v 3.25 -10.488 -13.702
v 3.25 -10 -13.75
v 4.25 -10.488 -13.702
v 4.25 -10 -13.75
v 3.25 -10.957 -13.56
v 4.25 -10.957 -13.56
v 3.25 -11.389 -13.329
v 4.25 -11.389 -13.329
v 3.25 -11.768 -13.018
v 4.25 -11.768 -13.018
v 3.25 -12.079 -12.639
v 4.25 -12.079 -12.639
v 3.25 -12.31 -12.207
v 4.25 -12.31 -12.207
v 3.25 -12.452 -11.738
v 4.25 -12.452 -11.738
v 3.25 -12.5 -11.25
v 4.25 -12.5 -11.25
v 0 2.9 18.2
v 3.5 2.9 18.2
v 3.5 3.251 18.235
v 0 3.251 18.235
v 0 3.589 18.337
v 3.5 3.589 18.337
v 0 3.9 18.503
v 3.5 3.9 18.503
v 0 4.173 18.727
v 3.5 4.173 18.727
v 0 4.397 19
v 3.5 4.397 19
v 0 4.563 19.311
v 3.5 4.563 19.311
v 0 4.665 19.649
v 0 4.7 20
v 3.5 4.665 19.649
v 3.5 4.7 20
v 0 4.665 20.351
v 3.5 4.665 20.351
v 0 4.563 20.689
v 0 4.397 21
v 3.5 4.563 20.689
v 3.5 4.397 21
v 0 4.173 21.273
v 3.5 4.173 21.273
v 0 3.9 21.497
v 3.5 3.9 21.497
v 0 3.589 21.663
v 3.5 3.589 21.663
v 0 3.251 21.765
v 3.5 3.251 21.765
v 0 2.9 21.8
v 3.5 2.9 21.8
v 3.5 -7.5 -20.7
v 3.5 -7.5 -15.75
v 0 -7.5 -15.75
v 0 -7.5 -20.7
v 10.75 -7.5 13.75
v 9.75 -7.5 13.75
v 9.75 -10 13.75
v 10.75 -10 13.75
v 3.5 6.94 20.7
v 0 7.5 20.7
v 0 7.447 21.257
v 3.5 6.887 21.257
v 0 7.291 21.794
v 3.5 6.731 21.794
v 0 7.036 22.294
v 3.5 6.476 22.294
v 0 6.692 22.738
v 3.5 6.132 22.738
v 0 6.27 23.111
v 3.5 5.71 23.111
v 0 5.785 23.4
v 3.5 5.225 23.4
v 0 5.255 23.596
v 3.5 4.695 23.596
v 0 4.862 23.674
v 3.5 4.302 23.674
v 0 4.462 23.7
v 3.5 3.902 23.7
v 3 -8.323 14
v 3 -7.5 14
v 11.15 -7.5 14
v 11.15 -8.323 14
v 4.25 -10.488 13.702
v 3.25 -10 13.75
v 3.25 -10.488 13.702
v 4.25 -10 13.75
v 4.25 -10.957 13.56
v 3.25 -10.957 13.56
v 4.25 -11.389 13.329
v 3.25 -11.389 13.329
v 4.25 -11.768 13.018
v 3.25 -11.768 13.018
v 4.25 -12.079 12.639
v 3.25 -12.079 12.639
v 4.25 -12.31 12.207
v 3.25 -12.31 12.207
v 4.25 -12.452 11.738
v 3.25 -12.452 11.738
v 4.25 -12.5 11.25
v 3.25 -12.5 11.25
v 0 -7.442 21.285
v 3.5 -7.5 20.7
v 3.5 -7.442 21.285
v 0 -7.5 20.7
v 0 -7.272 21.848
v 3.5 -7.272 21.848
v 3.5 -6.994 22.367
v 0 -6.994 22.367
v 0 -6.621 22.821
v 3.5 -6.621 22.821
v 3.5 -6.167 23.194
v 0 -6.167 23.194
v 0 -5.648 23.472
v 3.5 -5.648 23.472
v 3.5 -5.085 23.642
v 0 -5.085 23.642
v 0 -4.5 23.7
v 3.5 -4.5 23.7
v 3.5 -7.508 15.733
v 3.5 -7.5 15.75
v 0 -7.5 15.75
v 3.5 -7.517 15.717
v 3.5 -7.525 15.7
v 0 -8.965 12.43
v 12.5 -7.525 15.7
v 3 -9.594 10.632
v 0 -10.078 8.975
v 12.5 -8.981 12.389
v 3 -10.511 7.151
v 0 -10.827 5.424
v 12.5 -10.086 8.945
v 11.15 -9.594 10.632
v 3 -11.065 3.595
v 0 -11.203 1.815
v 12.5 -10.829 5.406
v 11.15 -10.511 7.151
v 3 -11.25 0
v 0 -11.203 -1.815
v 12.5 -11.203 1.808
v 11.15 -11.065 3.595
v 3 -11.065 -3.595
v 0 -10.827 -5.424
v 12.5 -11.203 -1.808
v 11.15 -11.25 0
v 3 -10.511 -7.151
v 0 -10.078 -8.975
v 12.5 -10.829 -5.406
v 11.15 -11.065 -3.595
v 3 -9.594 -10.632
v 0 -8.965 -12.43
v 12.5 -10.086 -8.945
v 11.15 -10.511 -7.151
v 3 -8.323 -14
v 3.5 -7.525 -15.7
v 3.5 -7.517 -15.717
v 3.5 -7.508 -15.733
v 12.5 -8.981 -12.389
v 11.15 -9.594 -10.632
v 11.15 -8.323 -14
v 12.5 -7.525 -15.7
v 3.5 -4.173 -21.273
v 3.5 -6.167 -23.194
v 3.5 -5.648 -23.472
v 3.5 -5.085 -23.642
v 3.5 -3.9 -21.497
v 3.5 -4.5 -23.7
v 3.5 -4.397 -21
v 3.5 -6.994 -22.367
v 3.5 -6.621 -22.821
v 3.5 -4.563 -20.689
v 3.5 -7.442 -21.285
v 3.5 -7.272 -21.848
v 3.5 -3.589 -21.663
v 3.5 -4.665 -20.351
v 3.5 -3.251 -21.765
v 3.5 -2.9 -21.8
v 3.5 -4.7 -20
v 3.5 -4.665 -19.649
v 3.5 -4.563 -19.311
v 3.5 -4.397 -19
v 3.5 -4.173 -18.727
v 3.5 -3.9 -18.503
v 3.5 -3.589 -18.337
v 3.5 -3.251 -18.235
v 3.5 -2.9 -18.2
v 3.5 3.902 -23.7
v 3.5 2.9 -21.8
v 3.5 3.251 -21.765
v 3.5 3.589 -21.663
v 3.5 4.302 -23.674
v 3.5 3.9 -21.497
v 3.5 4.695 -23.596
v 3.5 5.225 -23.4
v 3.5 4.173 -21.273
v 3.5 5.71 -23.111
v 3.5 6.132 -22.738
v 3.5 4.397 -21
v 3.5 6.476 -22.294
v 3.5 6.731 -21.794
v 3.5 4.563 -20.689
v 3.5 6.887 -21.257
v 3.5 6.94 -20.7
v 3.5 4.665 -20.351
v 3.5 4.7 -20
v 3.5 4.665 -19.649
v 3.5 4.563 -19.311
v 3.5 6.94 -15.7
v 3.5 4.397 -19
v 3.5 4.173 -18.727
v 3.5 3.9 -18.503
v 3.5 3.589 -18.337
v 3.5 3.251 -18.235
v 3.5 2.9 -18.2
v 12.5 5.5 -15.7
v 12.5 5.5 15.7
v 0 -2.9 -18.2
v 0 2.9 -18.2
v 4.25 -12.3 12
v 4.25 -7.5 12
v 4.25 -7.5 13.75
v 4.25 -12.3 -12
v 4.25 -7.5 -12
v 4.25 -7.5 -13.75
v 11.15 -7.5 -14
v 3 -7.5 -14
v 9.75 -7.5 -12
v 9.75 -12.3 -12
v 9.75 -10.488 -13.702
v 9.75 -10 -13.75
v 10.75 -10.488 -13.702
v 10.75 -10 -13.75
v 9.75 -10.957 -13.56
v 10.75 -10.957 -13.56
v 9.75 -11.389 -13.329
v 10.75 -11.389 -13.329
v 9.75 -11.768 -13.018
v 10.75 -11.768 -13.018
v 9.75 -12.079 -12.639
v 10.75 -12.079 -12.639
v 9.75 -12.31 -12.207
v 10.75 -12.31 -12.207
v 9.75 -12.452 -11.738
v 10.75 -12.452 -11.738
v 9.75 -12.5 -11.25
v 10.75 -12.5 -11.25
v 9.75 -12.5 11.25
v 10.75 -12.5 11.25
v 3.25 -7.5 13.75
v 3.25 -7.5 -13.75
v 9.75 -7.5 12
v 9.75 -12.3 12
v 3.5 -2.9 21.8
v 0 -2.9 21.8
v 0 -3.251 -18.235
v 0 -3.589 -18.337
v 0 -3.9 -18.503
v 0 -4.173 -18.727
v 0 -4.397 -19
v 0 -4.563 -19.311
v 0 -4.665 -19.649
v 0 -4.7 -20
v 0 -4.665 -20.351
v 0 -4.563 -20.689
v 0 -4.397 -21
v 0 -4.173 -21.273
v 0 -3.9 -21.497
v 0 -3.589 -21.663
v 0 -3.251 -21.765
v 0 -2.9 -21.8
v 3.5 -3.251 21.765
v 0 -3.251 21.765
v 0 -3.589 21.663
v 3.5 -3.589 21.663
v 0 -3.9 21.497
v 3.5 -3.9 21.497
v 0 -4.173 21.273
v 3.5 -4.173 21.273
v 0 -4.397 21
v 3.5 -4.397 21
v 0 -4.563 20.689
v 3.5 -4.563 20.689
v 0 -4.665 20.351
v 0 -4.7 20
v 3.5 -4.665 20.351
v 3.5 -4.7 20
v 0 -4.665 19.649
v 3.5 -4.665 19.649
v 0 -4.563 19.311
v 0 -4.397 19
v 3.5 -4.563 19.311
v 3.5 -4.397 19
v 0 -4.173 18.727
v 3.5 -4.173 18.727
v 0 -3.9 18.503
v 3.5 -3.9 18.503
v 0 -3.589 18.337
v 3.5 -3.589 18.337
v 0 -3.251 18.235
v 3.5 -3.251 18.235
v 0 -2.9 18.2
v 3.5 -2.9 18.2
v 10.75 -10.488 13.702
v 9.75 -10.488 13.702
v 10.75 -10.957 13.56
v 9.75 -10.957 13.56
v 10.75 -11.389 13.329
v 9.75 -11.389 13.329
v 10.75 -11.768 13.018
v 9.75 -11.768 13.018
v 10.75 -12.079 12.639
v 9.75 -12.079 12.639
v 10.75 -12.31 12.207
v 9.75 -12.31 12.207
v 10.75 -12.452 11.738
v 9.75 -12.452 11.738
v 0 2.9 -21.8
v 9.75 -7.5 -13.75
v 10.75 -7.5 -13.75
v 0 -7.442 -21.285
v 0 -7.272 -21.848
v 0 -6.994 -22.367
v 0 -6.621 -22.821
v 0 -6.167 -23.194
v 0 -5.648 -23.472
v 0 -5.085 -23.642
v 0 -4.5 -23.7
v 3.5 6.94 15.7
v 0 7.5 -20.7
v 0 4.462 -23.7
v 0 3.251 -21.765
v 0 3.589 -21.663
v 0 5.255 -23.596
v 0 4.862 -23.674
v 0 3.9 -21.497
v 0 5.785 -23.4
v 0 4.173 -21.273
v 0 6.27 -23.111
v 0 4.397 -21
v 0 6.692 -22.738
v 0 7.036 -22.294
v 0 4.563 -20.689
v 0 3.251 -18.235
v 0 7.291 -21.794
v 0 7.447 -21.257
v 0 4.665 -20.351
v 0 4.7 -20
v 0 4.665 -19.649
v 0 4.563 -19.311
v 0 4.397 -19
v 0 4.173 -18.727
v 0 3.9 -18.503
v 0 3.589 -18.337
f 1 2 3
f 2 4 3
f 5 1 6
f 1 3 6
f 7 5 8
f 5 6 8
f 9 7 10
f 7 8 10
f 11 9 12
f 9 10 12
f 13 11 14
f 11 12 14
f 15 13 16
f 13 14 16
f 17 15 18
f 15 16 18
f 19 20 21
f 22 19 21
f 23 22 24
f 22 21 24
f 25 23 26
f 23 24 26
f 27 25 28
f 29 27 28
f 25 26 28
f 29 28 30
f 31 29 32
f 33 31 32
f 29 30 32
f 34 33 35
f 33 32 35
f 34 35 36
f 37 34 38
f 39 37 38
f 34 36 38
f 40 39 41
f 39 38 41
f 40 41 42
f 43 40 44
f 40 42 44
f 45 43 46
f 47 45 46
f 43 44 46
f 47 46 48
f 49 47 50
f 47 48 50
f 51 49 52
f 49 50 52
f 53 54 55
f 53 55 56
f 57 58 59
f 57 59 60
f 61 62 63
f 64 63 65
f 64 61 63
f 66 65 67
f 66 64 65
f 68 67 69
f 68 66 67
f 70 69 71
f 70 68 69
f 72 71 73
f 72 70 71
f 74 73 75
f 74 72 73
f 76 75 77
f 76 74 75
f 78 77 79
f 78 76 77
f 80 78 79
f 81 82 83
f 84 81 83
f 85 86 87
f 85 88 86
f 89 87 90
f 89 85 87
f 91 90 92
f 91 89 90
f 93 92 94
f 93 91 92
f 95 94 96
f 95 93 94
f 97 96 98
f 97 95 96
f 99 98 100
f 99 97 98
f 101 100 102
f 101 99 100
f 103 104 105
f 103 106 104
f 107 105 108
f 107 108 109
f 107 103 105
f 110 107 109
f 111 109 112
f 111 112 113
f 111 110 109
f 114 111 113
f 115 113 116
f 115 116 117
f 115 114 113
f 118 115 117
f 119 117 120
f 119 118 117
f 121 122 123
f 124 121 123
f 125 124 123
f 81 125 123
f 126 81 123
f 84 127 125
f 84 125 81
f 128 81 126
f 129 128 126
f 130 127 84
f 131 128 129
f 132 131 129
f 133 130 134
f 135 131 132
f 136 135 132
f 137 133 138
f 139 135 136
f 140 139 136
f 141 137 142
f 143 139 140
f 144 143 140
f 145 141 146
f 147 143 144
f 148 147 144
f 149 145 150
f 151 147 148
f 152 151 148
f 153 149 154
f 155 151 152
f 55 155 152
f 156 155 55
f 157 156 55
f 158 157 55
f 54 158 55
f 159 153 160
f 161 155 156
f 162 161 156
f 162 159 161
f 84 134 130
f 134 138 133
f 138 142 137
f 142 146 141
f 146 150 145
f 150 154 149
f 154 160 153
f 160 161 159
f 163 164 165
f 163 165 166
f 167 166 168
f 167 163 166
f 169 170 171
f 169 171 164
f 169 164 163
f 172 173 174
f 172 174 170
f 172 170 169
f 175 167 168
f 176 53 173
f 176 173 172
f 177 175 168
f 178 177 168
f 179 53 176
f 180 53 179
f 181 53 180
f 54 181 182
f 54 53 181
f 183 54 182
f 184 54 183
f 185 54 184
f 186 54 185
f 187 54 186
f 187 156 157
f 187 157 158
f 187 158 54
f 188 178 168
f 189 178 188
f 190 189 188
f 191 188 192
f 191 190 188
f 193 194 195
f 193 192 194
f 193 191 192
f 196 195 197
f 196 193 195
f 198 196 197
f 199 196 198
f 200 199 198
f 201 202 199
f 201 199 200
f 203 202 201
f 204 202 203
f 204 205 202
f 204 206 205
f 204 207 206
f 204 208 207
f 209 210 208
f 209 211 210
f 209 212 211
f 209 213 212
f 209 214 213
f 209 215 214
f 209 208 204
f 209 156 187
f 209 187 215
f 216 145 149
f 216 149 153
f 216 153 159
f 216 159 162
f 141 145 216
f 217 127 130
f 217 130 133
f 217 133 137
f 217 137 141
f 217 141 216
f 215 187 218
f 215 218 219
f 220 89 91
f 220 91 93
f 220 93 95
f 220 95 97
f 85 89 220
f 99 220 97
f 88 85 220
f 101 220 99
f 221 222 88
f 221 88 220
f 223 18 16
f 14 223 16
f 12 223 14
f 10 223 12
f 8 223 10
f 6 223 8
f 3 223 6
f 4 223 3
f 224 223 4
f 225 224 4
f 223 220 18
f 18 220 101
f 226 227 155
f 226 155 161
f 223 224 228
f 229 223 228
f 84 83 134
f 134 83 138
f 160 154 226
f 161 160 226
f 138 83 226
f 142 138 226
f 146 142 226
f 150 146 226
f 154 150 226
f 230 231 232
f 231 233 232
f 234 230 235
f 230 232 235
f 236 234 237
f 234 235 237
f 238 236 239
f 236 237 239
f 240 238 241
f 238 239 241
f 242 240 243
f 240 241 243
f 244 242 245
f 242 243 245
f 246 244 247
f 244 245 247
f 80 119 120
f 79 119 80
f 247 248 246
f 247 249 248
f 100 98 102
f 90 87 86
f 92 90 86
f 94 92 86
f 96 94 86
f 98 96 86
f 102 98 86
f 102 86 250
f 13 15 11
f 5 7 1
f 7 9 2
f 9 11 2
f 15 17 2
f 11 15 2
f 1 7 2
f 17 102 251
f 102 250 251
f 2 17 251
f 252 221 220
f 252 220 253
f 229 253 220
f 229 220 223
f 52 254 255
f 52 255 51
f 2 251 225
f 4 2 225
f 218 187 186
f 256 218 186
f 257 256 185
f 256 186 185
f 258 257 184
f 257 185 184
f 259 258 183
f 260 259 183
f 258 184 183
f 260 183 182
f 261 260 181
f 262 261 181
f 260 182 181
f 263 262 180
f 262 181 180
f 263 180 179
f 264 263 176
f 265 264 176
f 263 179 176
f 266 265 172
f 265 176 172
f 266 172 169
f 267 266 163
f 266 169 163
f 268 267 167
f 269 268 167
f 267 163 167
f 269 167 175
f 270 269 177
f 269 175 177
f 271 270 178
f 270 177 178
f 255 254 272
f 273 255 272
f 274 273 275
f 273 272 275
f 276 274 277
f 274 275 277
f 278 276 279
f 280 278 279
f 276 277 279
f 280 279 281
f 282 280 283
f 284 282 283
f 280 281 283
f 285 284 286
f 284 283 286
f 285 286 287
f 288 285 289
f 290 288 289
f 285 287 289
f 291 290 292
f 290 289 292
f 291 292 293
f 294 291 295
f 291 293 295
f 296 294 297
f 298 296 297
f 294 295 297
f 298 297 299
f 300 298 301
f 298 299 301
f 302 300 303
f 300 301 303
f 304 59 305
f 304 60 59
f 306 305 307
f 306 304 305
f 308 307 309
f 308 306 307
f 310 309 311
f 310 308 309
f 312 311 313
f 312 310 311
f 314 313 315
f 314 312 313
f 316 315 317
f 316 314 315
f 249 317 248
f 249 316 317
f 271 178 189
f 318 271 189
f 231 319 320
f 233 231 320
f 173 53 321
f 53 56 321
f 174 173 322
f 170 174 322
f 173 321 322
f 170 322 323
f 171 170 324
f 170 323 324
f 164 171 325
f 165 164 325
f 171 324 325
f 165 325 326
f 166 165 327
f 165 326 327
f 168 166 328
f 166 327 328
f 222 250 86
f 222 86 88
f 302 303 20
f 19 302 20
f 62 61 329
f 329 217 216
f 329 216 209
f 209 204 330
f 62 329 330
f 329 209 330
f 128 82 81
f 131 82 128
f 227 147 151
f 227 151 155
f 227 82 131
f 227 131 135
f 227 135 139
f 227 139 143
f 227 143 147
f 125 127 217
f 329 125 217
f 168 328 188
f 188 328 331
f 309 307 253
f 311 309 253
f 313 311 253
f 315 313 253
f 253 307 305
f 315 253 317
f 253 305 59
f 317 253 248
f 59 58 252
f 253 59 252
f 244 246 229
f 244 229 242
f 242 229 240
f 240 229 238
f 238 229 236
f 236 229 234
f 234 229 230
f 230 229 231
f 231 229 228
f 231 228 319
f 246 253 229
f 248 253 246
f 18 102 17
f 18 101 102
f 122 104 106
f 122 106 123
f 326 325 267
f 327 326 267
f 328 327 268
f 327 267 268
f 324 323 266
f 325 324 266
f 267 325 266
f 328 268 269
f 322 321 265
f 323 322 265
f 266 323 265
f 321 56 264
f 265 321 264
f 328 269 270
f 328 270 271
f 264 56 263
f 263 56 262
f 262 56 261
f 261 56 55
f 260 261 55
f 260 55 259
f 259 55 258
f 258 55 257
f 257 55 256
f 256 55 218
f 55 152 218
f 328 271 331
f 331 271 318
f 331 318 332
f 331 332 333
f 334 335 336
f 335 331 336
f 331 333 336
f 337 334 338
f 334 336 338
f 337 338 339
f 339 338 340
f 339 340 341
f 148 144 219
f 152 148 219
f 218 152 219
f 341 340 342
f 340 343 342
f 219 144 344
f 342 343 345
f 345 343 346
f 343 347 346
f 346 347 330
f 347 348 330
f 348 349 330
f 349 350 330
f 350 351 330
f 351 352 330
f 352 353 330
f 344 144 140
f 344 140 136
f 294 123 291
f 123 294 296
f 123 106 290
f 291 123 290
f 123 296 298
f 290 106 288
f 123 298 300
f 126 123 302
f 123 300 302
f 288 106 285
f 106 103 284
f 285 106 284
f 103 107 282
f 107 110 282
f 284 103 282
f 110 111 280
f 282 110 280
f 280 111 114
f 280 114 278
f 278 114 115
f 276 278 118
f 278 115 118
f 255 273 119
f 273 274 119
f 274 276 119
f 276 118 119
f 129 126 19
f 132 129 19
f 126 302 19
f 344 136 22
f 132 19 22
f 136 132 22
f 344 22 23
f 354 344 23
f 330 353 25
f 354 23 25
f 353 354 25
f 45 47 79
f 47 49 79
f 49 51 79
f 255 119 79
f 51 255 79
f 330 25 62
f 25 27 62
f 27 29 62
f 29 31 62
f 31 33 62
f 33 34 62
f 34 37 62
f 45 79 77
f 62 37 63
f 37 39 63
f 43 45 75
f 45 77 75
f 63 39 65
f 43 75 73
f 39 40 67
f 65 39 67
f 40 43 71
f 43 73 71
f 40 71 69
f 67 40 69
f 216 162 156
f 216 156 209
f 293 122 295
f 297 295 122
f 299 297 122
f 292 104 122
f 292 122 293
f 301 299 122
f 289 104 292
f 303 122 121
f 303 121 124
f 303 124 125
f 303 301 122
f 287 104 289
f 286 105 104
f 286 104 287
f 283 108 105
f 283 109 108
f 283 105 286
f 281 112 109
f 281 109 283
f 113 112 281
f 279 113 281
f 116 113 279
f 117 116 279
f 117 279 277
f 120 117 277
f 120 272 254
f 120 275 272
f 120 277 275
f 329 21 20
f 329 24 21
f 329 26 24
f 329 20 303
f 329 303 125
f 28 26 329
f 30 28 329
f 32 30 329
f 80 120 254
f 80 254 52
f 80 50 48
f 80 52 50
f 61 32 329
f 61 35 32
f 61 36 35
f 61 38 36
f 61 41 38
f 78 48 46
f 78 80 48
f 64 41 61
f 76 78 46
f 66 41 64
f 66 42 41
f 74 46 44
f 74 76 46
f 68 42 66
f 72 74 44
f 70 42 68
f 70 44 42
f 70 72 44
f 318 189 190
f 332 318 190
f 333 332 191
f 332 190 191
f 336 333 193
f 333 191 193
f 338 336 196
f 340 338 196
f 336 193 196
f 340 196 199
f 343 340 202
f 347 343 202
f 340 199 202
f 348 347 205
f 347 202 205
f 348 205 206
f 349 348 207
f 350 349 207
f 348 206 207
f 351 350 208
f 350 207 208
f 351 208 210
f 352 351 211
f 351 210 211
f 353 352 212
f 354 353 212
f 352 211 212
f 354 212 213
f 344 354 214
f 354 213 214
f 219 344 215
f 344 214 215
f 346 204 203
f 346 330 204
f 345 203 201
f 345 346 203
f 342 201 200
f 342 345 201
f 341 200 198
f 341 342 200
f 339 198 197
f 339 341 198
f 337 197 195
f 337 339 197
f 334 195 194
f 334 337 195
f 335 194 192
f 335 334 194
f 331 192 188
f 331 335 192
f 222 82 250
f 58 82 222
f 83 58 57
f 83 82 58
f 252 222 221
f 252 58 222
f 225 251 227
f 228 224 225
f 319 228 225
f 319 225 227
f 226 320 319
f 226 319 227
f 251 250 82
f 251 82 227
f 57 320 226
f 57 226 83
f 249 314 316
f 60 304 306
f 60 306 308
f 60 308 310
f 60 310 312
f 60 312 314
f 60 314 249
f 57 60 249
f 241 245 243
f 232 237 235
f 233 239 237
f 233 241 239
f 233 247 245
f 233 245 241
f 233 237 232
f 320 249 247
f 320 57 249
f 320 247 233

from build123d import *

# Parameters (mm, degrees)
SKETCH_W        = 20
SKETCH_H        = 47.4
PAD_DEPTH       = 12.5
POCKET_DEPTH    = 12.501
POCKET001_DEPTH = 47.401
SKETCH003_W     = 20
SKETCH003_H     = 8
POCKET002_DEPTH = 9
SKETCH004_W     = 28
SKETCH004_H     = 8.15
POCKET003_DEPTH = 3.751
SKETCH005_W     = 27.5
SKETCH005_H     = 1
PAD001_DEPTH    = 5
SKETCH006_W     = 24
SKETCH006_H     = 5.5
PAD002_DEPTH    = 4.8
FILLET_R        = 2.5
FILLET001_R     = 3
POCKET004_DEPTH = 3.501


with BuildPart() as part:
    # Sketch → Pad (new body)
    with BuildSketch(Plane.YZ):
        with Locations((-2.5, 0)):
            Rectangle(SKETCH_W, SKETCH_H)
    extrude(amount=PAD_DEPTH)

    # Sketch001 (on Face6 of Pad) → Pocket (cut, through all)
    with BuildSketch(Plane.YZ.offset(12.5)):
        with BuildLine():
            Line((-7.5, 23.7), (-7.5, 15.75))
            ThreePointArc((-7.5, 15.75), (-11.25, 0), (-7.5, -15.75))
            Line((-7.5, -15.75), (-7.5, -23.7))
            Line((-7.5, -23.7), (-12.5, -23.7))
            Line((-12.5, -23.7), (-12.5, 23.7))
            Line((-12.5, 23.7), (-7.5, 23.7))
        make_face()
    extrude(amount=-POCKET_DEPTH, mode=Mode.SUBTRACT)

    # Sketch002 (on Face6 of Pocket) → Pocket001 (cut, through all)
    with BuildSketch(Plane.YX.offset(23.7)):
        Polygon((7.5, 0), (7.5, 12.5), (5.5, 12.5), align=None)
    extrude(amount=-POCKET001_DEPTH, mode=Mode.SUBTRACT)

    # Sketch003 (on Face4 of Pocket001) → Pocket002 (cut)
    with BuildSketch(Plane.YZ.offset(12.5)):
        with Locations((-2.5, 19.7)):
            Rectangle(SKETCH003_W, SKETCH003_H)
        with Locations((-2.5, -19.7)):
            Rectangle(SKETCH003_W, SKETCH003_H)
    extrude(amount=-POCKET002_DEPTH, mode=Mode.SUBTRACT)

    # Sketch004 (on Face3 of Pocket002) → Pocket003 (cut, through all)
    with BuildSketch(Plane(origin=(0, -7.5, 0), x_dir=(0, 0, -1), z_dir=(0, -1, 0))):
        with Locations((0, 7.075)):
            Rectangle(SKETCH004_W, SKETCH004_H)
    extrude(amount=POCKET003_DEPTH, mode=Mode.SUBTRACT)

    # Sketch005 (on Face17 of Pocket003) → Pad001 (join)
    with BuildSketch(Plane(origin=(0, -7.5, 0), x_dir=(0, 0, -1), z_dir=(0, -1, 0))):
        with Locations((0, 10.25)):
            Rectangle(SKETCH005_W, SKETCH005_H)
        with Locations((0, 3.75)):
            Rectangle(SKETCH005_W, SKETCH005_H)
    extrude(amount=PAD001_DEPTH)

    # Sketch006 (on Face17 of Pad001) → Pad002 (join)
    with BuildSketch(Plane(origin=(0, -7.5, 0), x_dir=(0, 0, -1), z_dir=(0, -1, 0))):
        with Locations((0, 7)):
            Rectangle(SKETCH006_W, SKETCH006_H)
    extrude(amount=PAD002_DEPTH)

    # Fillet
    fillet_edges = [part.edges().sort_by_distance(p)[0] for p in [
        (10.25, -12.5, 13.75),
        (3.75, -12.5, 13.75),
        (10.25, -12.5, -13.75),
        (3.75, -12.5, -13.75),
    ]]
    fillet(fillet_edges, radius=FILLET_R)

    # Fillet001
    fillet001_edges = [part.edges().sort_by_distance(p)[0] for p in [
        (1.75, -7.5, 23.7),
        (1.75, 7.22, 23.7),
        (1.75, 7.22, -23.7),
        (1.75, -7.5, -23.7),
    ]]
    fillet(fillet001_edges, radius=FILLET001_R)

    # Sketch007 (on Face12 of Fillet001) → Pocket004 (cut, through all)
    with BuildSketch(Plane.YZ.offset(3.5)):
        with BuildLine():
            ThreePointArc((-2.9, 21.8), (-4.7, 20), (-2.9, 18.2))
            Line((-2.9, 18.2), (2.9, 18.2))
            ThreePointArc((2.9, 18.2), (4.7, 20), (2.9, 21.8))
            Line((-2.9, 21.8), (2.9, 21.8))
        make_face()
        with BuildLine():
            ThreePointArc((-2.9, -18.2), (-4.7, -20), (-2.9, -21.8))
            Line((-2.9, -21.8), (2.9, -21.8))
            ThreePointArc((2.9, -21.8), (4.7, -20), (2.9, -18.2))
            Line((-2.9, -18.2), (2.9, -18.2))
        make_face()
    extrude(amount=-POCKET004_DEPTH, mode=Mode.SUBTRACT)


solid = part.part
